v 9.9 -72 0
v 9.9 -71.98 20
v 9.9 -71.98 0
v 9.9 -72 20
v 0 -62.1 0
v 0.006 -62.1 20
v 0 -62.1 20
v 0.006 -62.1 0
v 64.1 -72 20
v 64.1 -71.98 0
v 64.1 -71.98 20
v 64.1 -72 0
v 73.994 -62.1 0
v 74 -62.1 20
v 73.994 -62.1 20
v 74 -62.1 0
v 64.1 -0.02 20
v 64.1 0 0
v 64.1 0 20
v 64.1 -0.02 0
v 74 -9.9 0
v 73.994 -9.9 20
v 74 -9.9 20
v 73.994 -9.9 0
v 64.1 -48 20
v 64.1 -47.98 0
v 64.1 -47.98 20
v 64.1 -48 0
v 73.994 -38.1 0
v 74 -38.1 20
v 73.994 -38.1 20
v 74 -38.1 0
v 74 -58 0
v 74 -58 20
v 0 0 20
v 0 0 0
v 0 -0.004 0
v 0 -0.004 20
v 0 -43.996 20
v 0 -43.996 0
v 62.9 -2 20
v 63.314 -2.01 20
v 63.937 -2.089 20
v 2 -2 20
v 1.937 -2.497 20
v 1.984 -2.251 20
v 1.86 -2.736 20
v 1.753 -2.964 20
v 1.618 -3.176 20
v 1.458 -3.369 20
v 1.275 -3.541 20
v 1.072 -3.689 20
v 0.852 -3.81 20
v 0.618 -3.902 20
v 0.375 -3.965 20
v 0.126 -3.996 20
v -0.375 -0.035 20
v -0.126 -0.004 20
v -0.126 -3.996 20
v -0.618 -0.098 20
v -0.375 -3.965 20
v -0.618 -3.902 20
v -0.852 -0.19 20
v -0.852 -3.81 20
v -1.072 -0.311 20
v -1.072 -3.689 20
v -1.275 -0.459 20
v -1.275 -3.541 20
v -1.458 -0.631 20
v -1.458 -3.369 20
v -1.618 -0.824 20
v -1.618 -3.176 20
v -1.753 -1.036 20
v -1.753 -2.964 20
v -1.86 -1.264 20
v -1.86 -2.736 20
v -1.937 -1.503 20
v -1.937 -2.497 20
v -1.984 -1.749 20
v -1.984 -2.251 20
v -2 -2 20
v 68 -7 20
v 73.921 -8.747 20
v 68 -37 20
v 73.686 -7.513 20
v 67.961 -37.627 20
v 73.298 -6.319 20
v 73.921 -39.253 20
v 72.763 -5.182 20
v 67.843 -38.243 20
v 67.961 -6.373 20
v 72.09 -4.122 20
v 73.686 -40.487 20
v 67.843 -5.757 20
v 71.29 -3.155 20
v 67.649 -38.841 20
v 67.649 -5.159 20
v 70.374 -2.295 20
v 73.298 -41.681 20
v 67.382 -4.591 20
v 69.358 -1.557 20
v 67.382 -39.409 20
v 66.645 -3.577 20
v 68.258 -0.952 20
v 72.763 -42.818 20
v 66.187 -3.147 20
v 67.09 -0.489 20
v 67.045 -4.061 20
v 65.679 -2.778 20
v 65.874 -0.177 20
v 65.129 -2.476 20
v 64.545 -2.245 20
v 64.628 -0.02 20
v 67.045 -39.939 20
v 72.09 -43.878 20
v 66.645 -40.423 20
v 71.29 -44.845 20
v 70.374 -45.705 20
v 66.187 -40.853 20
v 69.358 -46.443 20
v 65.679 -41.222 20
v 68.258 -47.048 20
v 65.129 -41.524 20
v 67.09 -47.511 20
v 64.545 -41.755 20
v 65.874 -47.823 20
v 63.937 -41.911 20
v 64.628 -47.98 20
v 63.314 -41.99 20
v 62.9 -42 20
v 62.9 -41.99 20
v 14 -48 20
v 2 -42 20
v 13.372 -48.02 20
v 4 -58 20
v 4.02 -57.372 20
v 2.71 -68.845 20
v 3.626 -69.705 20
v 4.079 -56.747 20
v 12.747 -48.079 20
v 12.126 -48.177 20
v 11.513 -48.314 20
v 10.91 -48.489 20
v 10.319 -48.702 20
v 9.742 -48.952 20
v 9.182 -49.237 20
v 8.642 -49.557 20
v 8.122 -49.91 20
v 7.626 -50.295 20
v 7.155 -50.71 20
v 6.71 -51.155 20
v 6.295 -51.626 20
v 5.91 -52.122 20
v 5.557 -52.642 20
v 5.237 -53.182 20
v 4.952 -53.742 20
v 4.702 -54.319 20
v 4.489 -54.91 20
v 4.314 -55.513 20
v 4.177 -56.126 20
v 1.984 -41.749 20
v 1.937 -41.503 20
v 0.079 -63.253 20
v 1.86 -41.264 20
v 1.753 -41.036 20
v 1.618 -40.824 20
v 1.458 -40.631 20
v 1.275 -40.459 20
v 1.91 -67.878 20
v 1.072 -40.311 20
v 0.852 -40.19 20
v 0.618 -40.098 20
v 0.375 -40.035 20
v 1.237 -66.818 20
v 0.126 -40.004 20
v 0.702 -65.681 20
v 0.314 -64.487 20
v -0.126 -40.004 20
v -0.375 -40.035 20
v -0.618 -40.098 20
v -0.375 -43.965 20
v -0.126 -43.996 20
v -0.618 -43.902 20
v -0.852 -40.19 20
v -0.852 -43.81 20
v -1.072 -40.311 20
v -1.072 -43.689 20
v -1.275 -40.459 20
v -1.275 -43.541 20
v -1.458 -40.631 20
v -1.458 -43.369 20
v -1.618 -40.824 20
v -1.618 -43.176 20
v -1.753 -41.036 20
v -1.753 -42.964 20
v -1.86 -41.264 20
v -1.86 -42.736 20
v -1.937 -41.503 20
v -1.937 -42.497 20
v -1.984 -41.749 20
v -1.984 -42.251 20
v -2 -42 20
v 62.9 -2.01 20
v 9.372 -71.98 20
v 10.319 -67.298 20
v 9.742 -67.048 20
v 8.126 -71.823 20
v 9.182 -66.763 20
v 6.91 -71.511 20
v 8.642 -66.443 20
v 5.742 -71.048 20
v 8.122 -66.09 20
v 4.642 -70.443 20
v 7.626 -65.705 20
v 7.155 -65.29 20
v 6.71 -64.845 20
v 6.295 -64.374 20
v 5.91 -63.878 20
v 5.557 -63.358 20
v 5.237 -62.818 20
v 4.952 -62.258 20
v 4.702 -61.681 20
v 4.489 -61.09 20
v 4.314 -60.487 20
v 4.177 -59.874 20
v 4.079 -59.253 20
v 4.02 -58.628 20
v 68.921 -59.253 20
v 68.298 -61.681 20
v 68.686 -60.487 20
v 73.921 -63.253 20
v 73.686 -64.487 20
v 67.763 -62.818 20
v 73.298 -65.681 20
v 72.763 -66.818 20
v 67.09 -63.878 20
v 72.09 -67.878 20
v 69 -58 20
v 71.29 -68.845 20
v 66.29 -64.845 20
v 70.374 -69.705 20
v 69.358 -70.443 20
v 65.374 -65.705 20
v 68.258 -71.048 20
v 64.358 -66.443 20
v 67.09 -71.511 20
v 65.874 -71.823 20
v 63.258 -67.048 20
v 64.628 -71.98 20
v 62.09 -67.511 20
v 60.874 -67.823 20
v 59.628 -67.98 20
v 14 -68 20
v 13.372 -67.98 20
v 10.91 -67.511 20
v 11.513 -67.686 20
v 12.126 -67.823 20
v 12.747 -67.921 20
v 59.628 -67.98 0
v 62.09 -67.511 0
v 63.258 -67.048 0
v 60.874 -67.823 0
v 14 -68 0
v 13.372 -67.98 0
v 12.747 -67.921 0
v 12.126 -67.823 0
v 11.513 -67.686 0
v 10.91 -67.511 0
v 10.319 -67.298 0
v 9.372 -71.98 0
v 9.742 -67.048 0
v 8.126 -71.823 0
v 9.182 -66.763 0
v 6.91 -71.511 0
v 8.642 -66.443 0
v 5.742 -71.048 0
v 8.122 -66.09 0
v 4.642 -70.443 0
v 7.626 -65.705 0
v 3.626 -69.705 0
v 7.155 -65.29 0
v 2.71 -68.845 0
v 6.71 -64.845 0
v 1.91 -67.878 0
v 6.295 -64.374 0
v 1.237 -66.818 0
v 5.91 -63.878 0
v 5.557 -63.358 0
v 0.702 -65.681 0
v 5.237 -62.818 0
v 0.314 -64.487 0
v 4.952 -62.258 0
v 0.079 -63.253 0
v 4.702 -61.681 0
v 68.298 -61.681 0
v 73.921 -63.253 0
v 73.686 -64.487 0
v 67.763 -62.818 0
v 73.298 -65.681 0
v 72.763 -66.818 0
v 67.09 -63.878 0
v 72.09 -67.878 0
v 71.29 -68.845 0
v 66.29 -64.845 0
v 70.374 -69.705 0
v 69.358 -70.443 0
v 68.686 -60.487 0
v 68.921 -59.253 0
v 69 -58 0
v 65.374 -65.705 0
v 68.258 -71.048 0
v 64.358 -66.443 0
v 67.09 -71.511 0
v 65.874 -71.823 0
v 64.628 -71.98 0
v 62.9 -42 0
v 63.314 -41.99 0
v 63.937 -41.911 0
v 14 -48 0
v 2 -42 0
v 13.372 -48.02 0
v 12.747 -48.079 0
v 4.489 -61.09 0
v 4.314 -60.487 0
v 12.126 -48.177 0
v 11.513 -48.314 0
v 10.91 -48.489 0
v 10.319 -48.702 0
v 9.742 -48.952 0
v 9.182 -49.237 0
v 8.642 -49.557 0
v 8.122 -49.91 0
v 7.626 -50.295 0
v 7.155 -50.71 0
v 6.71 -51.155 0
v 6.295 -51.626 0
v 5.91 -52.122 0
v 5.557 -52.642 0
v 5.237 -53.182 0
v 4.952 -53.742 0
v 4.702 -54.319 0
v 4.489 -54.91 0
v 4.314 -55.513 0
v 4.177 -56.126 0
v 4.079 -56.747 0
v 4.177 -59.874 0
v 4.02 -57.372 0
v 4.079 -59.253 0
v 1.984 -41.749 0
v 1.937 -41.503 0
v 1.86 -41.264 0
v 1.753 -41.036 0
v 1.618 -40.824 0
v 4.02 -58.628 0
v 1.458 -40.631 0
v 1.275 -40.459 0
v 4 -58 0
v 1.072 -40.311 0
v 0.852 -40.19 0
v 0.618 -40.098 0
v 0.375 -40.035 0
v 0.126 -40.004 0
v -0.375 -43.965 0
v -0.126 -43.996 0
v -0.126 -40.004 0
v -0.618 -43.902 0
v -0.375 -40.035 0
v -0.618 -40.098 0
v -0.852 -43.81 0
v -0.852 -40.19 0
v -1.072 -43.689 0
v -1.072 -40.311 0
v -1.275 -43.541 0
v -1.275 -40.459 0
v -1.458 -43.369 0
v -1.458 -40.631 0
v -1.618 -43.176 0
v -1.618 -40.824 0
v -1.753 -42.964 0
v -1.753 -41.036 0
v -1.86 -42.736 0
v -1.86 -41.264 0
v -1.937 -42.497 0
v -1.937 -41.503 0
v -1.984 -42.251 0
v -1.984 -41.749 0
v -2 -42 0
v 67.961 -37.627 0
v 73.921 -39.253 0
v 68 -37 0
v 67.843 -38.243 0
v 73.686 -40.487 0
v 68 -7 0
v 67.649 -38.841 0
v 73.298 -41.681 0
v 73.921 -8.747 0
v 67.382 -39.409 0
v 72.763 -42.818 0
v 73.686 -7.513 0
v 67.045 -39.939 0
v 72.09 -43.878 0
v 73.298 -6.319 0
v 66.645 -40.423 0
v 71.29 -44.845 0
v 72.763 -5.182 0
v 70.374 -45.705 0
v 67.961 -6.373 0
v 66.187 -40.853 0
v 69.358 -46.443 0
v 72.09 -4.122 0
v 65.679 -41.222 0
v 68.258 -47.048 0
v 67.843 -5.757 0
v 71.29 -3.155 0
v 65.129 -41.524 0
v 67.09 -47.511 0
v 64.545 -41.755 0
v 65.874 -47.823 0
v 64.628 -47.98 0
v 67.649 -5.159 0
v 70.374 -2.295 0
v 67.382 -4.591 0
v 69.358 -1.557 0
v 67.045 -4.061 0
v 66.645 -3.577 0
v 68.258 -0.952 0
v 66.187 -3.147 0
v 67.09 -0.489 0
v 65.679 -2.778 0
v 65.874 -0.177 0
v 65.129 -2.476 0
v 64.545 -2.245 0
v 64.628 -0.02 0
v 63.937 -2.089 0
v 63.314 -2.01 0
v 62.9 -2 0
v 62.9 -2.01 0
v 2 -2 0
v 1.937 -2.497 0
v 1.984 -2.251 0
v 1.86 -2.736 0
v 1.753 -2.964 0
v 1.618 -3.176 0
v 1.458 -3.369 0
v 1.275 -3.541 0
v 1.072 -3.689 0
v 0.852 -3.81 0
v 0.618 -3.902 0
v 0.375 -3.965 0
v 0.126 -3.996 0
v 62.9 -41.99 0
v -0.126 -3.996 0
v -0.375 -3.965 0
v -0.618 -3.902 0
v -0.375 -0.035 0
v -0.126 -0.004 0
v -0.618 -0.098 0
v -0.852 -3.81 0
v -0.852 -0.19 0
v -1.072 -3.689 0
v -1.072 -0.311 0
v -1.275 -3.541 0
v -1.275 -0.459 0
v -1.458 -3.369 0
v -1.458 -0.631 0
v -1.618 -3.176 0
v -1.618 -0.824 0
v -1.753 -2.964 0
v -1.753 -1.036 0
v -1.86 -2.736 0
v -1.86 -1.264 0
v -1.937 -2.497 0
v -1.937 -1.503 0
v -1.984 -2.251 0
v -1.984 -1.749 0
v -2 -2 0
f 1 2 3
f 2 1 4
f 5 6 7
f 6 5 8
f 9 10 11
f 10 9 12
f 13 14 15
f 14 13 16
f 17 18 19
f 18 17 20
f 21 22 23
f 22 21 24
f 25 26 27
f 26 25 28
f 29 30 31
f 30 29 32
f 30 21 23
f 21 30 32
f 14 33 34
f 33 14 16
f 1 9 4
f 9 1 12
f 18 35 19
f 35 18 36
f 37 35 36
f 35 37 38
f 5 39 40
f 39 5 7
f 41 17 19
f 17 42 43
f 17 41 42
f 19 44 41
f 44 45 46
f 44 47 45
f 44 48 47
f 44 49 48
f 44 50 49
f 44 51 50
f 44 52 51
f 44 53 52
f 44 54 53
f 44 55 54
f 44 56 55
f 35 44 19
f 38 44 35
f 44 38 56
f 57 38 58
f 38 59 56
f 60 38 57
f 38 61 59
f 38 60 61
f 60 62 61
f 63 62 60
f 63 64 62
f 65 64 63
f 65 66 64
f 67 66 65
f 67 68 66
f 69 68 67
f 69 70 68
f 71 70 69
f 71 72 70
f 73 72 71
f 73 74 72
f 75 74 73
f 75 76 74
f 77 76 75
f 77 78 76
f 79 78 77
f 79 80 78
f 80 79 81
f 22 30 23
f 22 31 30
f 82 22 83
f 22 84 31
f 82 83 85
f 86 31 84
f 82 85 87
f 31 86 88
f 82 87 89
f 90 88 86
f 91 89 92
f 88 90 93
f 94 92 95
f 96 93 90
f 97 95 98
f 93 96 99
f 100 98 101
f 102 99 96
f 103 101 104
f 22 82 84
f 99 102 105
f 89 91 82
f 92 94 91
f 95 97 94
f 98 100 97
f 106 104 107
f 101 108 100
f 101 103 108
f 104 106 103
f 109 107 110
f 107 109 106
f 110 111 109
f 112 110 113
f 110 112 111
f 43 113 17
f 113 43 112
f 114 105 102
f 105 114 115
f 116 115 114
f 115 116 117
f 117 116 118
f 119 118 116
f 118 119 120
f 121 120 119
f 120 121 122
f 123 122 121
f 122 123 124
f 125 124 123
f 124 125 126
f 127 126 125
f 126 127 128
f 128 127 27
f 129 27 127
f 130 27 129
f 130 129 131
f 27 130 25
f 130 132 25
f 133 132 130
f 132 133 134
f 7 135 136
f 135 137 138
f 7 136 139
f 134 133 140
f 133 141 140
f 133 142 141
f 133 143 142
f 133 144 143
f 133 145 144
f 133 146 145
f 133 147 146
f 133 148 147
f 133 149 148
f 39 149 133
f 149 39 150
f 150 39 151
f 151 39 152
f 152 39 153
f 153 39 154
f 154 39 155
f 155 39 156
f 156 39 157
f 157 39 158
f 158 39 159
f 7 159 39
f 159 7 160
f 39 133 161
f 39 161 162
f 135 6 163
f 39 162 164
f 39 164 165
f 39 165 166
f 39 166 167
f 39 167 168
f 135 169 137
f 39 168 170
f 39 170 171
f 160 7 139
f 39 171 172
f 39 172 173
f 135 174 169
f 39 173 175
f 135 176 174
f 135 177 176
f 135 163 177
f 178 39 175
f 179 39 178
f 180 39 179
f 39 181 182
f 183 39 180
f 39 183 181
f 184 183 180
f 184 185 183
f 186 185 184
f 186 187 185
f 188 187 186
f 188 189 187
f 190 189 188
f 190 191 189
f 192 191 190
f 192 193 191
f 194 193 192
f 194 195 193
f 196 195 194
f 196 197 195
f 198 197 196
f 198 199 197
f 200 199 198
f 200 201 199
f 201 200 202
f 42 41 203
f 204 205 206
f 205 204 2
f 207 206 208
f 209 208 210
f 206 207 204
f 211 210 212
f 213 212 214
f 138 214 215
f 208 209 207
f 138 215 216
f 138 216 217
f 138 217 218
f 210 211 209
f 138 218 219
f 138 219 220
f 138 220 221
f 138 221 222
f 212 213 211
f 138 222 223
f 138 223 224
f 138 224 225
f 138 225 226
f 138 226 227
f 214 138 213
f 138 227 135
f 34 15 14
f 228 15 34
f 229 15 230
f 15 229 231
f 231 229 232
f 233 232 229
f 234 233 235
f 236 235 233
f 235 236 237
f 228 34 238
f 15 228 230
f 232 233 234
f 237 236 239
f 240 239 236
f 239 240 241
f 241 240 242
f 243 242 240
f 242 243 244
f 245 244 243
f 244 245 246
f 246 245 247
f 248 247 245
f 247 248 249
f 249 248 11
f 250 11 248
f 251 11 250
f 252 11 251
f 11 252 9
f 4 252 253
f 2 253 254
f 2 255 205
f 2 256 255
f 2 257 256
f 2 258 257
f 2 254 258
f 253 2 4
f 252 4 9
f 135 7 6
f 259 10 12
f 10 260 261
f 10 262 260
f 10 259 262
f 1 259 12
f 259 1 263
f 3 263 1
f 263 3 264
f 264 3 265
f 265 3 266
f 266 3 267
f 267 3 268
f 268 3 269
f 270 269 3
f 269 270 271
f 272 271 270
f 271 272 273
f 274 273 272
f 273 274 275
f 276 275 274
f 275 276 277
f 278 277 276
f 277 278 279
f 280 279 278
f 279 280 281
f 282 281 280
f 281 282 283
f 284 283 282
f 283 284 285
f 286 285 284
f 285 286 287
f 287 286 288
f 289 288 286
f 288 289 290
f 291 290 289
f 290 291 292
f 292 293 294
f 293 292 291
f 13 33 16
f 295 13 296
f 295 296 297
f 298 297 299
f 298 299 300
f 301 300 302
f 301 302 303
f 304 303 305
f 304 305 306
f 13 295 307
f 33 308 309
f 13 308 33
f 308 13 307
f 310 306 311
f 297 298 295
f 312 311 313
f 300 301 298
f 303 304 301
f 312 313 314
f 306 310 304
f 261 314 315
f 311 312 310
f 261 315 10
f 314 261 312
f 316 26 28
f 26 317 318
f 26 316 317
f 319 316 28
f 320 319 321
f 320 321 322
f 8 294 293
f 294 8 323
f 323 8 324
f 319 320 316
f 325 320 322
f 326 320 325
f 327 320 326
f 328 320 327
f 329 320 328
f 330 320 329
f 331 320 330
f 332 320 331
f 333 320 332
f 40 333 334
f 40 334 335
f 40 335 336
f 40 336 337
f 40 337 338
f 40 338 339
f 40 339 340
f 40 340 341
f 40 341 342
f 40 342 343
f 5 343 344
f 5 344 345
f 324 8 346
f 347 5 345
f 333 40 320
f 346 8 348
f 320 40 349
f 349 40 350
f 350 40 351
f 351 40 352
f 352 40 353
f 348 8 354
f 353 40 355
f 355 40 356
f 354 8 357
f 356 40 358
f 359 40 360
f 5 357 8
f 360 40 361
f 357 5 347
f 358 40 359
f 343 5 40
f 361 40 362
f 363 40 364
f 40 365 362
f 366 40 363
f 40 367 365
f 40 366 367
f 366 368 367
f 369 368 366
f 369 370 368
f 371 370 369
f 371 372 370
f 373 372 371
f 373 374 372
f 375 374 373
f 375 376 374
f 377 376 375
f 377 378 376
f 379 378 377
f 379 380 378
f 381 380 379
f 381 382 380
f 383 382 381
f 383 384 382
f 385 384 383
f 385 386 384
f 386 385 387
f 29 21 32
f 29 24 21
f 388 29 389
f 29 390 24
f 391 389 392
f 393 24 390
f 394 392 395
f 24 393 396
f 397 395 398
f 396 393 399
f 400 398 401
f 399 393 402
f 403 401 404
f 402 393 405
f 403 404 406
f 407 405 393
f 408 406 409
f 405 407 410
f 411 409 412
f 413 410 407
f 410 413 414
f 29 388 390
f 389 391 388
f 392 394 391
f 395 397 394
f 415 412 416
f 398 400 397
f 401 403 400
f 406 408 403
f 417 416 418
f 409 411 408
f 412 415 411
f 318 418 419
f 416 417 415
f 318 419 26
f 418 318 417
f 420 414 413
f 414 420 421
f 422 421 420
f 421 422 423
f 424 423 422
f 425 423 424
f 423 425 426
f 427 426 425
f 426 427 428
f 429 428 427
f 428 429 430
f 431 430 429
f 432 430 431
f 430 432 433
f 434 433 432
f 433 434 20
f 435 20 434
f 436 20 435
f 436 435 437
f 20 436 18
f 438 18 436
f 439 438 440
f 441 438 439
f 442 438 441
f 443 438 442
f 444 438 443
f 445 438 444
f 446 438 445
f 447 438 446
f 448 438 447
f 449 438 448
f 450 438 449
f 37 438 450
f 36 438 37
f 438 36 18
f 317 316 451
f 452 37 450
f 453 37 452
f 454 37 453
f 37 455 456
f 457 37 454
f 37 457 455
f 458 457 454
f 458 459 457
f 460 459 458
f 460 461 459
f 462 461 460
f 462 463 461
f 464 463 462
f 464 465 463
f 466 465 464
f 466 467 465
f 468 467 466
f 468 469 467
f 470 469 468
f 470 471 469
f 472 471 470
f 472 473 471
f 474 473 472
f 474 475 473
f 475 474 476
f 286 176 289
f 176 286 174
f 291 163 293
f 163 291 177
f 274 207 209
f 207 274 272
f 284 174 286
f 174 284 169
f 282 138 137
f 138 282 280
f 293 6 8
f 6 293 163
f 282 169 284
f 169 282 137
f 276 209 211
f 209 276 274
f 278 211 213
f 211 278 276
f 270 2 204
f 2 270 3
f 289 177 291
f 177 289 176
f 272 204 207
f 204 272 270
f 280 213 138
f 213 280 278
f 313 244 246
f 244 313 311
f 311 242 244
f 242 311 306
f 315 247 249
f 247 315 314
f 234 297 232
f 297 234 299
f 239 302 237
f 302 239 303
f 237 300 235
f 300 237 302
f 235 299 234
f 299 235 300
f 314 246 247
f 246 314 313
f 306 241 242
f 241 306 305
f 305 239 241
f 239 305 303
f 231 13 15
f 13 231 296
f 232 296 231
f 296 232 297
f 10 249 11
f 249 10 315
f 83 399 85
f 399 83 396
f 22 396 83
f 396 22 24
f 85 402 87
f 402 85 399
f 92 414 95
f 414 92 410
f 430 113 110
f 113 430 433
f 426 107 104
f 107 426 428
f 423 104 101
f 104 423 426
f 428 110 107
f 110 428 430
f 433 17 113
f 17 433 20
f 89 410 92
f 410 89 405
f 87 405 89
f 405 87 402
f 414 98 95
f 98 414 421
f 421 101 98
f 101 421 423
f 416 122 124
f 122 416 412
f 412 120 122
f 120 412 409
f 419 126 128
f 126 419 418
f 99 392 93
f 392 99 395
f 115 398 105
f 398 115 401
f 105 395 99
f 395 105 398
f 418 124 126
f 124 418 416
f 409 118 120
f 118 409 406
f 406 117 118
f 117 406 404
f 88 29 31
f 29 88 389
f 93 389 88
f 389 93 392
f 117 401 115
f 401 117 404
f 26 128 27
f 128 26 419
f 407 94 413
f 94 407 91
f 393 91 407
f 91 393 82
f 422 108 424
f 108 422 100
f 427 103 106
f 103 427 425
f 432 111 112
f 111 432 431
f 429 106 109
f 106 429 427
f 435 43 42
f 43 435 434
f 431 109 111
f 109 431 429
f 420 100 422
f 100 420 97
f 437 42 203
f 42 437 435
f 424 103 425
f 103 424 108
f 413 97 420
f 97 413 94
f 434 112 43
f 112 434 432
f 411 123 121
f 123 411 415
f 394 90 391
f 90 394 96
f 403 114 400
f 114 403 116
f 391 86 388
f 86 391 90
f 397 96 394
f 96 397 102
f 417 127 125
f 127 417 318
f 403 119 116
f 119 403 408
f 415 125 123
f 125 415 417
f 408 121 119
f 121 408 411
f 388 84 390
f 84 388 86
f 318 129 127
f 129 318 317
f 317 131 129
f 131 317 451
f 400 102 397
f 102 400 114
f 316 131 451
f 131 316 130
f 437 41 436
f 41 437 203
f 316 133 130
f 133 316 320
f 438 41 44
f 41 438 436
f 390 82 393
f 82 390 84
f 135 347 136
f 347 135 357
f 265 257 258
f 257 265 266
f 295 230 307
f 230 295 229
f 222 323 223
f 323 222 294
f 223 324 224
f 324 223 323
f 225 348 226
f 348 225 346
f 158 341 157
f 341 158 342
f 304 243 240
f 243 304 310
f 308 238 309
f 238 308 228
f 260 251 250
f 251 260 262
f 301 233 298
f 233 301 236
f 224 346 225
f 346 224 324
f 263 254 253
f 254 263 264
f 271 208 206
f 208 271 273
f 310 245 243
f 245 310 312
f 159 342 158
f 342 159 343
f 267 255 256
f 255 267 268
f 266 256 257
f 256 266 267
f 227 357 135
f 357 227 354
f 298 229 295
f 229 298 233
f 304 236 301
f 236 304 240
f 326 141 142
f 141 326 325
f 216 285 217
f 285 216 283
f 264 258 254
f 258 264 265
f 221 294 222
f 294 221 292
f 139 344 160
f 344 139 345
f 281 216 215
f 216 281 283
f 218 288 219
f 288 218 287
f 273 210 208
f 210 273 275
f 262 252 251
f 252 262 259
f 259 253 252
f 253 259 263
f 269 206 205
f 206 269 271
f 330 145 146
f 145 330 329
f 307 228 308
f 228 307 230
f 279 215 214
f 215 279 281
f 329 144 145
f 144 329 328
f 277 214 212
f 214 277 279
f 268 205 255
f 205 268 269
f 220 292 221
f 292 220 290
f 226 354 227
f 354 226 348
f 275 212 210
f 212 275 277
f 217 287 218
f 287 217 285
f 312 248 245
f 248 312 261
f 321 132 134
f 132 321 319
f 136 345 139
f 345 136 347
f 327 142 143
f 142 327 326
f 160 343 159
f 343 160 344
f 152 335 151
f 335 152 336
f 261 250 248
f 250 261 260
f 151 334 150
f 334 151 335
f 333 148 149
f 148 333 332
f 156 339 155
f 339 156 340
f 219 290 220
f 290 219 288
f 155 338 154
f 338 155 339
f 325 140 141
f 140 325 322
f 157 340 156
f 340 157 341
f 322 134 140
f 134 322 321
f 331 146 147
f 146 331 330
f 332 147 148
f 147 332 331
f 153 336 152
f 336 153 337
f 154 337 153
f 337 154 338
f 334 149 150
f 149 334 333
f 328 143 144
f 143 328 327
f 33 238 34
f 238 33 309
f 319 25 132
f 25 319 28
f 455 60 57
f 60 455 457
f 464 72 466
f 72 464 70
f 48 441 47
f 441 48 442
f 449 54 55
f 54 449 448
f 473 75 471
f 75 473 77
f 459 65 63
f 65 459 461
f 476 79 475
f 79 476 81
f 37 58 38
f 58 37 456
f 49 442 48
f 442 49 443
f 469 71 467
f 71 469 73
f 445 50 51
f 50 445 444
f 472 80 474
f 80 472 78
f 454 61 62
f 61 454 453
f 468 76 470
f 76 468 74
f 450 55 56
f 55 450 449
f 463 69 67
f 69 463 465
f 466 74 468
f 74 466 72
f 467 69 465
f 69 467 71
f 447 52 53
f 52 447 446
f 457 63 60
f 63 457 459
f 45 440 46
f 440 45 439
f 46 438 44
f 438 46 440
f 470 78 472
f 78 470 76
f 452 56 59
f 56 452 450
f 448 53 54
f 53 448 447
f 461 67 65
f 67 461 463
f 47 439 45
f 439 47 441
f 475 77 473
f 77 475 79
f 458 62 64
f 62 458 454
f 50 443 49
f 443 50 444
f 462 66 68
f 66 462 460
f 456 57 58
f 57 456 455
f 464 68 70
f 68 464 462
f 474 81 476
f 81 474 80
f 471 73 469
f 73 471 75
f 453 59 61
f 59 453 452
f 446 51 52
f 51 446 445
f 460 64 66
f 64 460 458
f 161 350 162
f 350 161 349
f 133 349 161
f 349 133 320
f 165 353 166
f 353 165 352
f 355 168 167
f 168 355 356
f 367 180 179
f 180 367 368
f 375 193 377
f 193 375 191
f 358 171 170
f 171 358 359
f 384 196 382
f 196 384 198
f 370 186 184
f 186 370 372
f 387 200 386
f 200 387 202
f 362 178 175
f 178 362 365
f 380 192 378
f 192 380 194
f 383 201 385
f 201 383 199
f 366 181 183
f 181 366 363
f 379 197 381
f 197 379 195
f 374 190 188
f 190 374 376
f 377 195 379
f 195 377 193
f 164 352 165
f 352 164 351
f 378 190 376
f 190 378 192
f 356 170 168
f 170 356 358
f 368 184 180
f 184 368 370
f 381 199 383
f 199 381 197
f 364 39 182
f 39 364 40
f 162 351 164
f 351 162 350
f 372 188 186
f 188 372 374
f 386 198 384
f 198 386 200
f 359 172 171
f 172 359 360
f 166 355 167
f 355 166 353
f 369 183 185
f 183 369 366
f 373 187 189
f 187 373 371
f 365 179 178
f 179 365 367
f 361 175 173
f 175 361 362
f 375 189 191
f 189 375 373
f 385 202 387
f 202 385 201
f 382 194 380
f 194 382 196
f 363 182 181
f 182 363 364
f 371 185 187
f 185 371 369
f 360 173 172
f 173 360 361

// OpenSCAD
$desk_height = 40;
$width =  20;
$depth = 70;
$cable_diameter = 20;
$wall_thickness = 2;
$radius_outer_edge = 10;
$radius_inner_edge = 5;

difference()
{
    rotate([90, 0, 0])
    {
        difference()
        {
            cube([$depth + $wall_thickness * 2, $width, $desk_height + $wall_thickness * 2 + $cable_diameter + $wall_thickness * 4]);

        rotate([-90, 0, 0])
            {
            translate([-0.1, -$desk_height - $wall_thickness * 6 - $cable_diameter - 0.1, -0.5])
            cube([$radius_outer_edge, $radius_outer_edge, $width + 1]);

            translate([0.1 + $depth + $wall_thickness * 2 - $radius_outer_edge, -$desk_height - $wall_thickness * 6 - $cable_diameter - 0.1, -0.5])
            cube([$radius_outer_edge, $radius_outer_edge, $width + 1]);

            translate([0.1 + $depth + $wall_thickness * 2 - $radius_outer_edge, -$radius_outer_edge + 0.1, -0.5])
            cube([$radius_outer_edge, $radius_outer_edge, $width + 1]);

            translate([0.1 + $depth + $wall_thickness * 2 - $radius_outer_edge, -$desk_height - $wall_thickness * 4 - 0.1, -0.5])
            cube([$radius_outer_edge, $radius_outer_edge, $width + 1]);
            }
        }

        rotate([-90, 0, 0])
        {
            translate([$radius_outer_edge, -$desk_height - $wall_thickness * 6 - $cable_diameter + $radius_outer_edge, 0])
            cylinder($width, $radius_outer_edge, $radius_outer_edge, $fn = 50);

            translate([$depth + $wall_thickness * 2 - $radius_outer_edge , -$desk_height - $wall_thickness * 6 - $cable_diameter + $radius_outer_edge, 0])
            cylinder($width, $radius_outer_edge, $radius_outer_edge, $fn = 50);

            translate([$depth + $wall_thickness * 2 - $radius_outer_edge, -$radius_outer_edge, 0])
            cylinder($width, $radius_outer_edge, $radius_outer_edge, $fn = 50);

            translate([$depth + $wall_thickness * 2 - $radius_outer_edge, -$desk_height - $wall_thickness * 4 + $radius_outer_edge, 0])
            cylinder($width, $radius_outer_edge, $radius_outer_edge, $fn = 50);    
        }
    }
    
    rotate([90, 0, 0])
    {
        translate([-0.1, -$wall_thickness / 2, $wall_thickness])
        cube([$depth - $wall_thickness - $radius_inner_edge, $width + $wall_thickness, $desk_height]);

        translate([0, -$wall_thickness / 2, $wall_thickness + $radius_inner_edge])
        cube([$depth - $wall_thickness, $width + $wall_thickness, $desk_height - $radius_inner_edge * 2]);

        hull()
        {
            rotate([-90, 0, 0])
                translate([$cable_diameter / 2 + $wall_thickness * 2, -$desk_height - $wall_thickness * 4 - $cable_diameter / 2, -1])
                    cylinder($width + 2, $cable_diameter / 2, $cable_diameter / 2, $fn = 100);

            rotate([-90, 0, 0])
                translate([$depth - $wall_thickness / 2 - $cable_diameter / 2, -$desk_height - $wall_thickness * 4 - $cable_diameter / 2, -1])
                    cylinder($width + 2, $cable_diameter / 2, $cable_diameter / 2, $fn = 50);
        }

        translate([$wall_thickness * 2 + $cable_diameter / 2, -0.5, $wall_thickness * 4 + $desk_height])
        cube([$depth, $width + 1, $cable_diameter / 2]);

        rotate([-90, 0, 0])
        {
            translate([$depth - $wall_thickness - $radius_inner_edge, -$radius_inner_edge - $wall_thickness, -0.5])
            cylinder($width + 1, $radius_inner_edge, $radius_inner_edge, $fn = 50);

            translate([$depth - $wall_thickness - $radius_inner_edge, -$desk_height - $wall_thickness + $radius_inner_edge, -0.5])
            cylinder($width + 1, $radius_inner_edge, $radius_inner_edge, $fn = 50);
        }
    }
}

rotate([90, 0, 0])
{
translate([0, 0, $wall_thickness])
    rotate([-90, 0, 0])
        cylinder($width, $wall_thickness, $wall_thickness, $fn = 50);

translate([0, 0, , $desk_height + $wall_thickness])
    rotate([-90, 0, 0])
        cylinder($width, $wall_thickness, $wall_thickness, $fn = 50);
}
